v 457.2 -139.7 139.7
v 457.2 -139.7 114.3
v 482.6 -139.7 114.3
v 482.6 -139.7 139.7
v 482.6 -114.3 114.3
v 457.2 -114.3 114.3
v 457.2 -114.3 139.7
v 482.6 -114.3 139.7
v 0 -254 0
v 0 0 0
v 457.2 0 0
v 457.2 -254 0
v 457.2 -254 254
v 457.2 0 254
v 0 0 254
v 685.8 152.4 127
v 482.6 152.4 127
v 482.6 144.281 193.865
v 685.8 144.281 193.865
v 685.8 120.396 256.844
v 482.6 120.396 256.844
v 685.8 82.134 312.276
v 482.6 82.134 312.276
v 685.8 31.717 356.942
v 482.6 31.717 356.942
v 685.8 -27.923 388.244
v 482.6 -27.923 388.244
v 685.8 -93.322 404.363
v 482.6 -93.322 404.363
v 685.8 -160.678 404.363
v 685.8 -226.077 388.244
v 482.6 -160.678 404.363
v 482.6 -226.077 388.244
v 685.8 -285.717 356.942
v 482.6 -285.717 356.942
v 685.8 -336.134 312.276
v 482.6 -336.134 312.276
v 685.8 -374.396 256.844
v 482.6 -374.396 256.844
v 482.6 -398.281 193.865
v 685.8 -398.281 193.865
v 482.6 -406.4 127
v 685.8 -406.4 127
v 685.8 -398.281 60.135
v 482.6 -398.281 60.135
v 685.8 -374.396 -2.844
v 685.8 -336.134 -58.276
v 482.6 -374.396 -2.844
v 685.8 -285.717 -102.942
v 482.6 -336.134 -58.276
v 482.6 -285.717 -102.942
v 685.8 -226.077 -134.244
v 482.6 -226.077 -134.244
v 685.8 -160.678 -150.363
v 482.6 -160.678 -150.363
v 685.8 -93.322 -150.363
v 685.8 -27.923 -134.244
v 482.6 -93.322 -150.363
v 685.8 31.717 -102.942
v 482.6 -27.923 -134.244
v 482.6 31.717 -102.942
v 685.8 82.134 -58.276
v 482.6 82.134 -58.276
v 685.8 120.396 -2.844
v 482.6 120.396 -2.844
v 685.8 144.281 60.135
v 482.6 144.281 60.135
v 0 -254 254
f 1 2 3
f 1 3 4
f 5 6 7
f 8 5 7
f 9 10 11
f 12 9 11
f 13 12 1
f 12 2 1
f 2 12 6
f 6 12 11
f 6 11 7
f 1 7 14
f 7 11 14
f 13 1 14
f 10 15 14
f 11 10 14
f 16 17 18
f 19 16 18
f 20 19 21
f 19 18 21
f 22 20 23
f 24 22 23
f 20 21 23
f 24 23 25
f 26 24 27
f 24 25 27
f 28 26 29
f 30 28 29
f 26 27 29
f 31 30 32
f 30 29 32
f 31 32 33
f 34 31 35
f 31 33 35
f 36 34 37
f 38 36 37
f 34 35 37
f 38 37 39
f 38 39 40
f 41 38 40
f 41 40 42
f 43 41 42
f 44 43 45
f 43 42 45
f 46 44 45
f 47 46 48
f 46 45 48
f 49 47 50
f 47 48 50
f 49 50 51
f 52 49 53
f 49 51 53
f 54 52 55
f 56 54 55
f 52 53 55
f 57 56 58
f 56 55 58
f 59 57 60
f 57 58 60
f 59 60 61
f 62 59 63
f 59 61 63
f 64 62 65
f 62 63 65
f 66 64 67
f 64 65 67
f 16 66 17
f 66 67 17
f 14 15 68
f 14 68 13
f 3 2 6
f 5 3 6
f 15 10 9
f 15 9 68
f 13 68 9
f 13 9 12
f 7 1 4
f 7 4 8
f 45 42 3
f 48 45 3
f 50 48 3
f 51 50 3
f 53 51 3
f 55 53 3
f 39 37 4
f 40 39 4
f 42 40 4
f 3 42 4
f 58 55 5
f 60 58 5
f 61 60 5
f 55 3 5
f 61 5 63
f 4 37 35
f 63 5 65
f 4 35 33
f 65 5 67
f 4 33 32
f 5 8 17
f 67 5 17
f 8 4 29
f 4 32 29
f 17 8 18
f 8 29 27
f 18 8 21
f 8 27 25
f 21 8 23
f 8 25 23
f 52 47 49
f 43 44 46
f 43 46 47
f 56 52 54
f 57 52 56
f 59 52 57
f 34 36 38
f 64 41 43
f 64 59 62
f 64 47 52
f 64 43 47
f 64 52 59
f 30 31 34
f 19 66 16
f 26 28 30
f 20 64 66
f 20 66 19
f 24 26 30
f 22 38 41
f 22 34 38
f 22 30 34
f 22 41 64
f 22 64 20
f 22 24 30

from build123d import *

# Parameters (mm, degrees)
F0_W     = 457.2
F0_H     = 254
F1_DEPTH = 254
F2_W     = 25.4
F2_H     = 25.4
F3_DEPTH = 25.4
F4_R     = 279.4
F5_DEPTH = 203.2


with BuildPart() as f1:
    # F0 (on Front) → F1 (new body)
    with BuildSketch(Plane.XZ):
        with Locations((228.6, 127)):
            Rectangle(F0_W, F0_H)
    extrude(amount=F1_DEPTH)

    # F2 (on face) → F3 (join)
    with BuildSketch(Plane.YZ.offset(457.2)):
        with Locations((-127, 127)):
            Rectangle(F2_W, F2_H)
    extrude(amount=F3_DEPTH)

    # F4 (on face) → F5 (join)
    with BuildSketch(Plane.YZ.offset(482.6)):
        with Locations((-127, 127)):
            Circle(F4_R)
    extrude(amount=F5_DEPTH)


solid = f1.part
